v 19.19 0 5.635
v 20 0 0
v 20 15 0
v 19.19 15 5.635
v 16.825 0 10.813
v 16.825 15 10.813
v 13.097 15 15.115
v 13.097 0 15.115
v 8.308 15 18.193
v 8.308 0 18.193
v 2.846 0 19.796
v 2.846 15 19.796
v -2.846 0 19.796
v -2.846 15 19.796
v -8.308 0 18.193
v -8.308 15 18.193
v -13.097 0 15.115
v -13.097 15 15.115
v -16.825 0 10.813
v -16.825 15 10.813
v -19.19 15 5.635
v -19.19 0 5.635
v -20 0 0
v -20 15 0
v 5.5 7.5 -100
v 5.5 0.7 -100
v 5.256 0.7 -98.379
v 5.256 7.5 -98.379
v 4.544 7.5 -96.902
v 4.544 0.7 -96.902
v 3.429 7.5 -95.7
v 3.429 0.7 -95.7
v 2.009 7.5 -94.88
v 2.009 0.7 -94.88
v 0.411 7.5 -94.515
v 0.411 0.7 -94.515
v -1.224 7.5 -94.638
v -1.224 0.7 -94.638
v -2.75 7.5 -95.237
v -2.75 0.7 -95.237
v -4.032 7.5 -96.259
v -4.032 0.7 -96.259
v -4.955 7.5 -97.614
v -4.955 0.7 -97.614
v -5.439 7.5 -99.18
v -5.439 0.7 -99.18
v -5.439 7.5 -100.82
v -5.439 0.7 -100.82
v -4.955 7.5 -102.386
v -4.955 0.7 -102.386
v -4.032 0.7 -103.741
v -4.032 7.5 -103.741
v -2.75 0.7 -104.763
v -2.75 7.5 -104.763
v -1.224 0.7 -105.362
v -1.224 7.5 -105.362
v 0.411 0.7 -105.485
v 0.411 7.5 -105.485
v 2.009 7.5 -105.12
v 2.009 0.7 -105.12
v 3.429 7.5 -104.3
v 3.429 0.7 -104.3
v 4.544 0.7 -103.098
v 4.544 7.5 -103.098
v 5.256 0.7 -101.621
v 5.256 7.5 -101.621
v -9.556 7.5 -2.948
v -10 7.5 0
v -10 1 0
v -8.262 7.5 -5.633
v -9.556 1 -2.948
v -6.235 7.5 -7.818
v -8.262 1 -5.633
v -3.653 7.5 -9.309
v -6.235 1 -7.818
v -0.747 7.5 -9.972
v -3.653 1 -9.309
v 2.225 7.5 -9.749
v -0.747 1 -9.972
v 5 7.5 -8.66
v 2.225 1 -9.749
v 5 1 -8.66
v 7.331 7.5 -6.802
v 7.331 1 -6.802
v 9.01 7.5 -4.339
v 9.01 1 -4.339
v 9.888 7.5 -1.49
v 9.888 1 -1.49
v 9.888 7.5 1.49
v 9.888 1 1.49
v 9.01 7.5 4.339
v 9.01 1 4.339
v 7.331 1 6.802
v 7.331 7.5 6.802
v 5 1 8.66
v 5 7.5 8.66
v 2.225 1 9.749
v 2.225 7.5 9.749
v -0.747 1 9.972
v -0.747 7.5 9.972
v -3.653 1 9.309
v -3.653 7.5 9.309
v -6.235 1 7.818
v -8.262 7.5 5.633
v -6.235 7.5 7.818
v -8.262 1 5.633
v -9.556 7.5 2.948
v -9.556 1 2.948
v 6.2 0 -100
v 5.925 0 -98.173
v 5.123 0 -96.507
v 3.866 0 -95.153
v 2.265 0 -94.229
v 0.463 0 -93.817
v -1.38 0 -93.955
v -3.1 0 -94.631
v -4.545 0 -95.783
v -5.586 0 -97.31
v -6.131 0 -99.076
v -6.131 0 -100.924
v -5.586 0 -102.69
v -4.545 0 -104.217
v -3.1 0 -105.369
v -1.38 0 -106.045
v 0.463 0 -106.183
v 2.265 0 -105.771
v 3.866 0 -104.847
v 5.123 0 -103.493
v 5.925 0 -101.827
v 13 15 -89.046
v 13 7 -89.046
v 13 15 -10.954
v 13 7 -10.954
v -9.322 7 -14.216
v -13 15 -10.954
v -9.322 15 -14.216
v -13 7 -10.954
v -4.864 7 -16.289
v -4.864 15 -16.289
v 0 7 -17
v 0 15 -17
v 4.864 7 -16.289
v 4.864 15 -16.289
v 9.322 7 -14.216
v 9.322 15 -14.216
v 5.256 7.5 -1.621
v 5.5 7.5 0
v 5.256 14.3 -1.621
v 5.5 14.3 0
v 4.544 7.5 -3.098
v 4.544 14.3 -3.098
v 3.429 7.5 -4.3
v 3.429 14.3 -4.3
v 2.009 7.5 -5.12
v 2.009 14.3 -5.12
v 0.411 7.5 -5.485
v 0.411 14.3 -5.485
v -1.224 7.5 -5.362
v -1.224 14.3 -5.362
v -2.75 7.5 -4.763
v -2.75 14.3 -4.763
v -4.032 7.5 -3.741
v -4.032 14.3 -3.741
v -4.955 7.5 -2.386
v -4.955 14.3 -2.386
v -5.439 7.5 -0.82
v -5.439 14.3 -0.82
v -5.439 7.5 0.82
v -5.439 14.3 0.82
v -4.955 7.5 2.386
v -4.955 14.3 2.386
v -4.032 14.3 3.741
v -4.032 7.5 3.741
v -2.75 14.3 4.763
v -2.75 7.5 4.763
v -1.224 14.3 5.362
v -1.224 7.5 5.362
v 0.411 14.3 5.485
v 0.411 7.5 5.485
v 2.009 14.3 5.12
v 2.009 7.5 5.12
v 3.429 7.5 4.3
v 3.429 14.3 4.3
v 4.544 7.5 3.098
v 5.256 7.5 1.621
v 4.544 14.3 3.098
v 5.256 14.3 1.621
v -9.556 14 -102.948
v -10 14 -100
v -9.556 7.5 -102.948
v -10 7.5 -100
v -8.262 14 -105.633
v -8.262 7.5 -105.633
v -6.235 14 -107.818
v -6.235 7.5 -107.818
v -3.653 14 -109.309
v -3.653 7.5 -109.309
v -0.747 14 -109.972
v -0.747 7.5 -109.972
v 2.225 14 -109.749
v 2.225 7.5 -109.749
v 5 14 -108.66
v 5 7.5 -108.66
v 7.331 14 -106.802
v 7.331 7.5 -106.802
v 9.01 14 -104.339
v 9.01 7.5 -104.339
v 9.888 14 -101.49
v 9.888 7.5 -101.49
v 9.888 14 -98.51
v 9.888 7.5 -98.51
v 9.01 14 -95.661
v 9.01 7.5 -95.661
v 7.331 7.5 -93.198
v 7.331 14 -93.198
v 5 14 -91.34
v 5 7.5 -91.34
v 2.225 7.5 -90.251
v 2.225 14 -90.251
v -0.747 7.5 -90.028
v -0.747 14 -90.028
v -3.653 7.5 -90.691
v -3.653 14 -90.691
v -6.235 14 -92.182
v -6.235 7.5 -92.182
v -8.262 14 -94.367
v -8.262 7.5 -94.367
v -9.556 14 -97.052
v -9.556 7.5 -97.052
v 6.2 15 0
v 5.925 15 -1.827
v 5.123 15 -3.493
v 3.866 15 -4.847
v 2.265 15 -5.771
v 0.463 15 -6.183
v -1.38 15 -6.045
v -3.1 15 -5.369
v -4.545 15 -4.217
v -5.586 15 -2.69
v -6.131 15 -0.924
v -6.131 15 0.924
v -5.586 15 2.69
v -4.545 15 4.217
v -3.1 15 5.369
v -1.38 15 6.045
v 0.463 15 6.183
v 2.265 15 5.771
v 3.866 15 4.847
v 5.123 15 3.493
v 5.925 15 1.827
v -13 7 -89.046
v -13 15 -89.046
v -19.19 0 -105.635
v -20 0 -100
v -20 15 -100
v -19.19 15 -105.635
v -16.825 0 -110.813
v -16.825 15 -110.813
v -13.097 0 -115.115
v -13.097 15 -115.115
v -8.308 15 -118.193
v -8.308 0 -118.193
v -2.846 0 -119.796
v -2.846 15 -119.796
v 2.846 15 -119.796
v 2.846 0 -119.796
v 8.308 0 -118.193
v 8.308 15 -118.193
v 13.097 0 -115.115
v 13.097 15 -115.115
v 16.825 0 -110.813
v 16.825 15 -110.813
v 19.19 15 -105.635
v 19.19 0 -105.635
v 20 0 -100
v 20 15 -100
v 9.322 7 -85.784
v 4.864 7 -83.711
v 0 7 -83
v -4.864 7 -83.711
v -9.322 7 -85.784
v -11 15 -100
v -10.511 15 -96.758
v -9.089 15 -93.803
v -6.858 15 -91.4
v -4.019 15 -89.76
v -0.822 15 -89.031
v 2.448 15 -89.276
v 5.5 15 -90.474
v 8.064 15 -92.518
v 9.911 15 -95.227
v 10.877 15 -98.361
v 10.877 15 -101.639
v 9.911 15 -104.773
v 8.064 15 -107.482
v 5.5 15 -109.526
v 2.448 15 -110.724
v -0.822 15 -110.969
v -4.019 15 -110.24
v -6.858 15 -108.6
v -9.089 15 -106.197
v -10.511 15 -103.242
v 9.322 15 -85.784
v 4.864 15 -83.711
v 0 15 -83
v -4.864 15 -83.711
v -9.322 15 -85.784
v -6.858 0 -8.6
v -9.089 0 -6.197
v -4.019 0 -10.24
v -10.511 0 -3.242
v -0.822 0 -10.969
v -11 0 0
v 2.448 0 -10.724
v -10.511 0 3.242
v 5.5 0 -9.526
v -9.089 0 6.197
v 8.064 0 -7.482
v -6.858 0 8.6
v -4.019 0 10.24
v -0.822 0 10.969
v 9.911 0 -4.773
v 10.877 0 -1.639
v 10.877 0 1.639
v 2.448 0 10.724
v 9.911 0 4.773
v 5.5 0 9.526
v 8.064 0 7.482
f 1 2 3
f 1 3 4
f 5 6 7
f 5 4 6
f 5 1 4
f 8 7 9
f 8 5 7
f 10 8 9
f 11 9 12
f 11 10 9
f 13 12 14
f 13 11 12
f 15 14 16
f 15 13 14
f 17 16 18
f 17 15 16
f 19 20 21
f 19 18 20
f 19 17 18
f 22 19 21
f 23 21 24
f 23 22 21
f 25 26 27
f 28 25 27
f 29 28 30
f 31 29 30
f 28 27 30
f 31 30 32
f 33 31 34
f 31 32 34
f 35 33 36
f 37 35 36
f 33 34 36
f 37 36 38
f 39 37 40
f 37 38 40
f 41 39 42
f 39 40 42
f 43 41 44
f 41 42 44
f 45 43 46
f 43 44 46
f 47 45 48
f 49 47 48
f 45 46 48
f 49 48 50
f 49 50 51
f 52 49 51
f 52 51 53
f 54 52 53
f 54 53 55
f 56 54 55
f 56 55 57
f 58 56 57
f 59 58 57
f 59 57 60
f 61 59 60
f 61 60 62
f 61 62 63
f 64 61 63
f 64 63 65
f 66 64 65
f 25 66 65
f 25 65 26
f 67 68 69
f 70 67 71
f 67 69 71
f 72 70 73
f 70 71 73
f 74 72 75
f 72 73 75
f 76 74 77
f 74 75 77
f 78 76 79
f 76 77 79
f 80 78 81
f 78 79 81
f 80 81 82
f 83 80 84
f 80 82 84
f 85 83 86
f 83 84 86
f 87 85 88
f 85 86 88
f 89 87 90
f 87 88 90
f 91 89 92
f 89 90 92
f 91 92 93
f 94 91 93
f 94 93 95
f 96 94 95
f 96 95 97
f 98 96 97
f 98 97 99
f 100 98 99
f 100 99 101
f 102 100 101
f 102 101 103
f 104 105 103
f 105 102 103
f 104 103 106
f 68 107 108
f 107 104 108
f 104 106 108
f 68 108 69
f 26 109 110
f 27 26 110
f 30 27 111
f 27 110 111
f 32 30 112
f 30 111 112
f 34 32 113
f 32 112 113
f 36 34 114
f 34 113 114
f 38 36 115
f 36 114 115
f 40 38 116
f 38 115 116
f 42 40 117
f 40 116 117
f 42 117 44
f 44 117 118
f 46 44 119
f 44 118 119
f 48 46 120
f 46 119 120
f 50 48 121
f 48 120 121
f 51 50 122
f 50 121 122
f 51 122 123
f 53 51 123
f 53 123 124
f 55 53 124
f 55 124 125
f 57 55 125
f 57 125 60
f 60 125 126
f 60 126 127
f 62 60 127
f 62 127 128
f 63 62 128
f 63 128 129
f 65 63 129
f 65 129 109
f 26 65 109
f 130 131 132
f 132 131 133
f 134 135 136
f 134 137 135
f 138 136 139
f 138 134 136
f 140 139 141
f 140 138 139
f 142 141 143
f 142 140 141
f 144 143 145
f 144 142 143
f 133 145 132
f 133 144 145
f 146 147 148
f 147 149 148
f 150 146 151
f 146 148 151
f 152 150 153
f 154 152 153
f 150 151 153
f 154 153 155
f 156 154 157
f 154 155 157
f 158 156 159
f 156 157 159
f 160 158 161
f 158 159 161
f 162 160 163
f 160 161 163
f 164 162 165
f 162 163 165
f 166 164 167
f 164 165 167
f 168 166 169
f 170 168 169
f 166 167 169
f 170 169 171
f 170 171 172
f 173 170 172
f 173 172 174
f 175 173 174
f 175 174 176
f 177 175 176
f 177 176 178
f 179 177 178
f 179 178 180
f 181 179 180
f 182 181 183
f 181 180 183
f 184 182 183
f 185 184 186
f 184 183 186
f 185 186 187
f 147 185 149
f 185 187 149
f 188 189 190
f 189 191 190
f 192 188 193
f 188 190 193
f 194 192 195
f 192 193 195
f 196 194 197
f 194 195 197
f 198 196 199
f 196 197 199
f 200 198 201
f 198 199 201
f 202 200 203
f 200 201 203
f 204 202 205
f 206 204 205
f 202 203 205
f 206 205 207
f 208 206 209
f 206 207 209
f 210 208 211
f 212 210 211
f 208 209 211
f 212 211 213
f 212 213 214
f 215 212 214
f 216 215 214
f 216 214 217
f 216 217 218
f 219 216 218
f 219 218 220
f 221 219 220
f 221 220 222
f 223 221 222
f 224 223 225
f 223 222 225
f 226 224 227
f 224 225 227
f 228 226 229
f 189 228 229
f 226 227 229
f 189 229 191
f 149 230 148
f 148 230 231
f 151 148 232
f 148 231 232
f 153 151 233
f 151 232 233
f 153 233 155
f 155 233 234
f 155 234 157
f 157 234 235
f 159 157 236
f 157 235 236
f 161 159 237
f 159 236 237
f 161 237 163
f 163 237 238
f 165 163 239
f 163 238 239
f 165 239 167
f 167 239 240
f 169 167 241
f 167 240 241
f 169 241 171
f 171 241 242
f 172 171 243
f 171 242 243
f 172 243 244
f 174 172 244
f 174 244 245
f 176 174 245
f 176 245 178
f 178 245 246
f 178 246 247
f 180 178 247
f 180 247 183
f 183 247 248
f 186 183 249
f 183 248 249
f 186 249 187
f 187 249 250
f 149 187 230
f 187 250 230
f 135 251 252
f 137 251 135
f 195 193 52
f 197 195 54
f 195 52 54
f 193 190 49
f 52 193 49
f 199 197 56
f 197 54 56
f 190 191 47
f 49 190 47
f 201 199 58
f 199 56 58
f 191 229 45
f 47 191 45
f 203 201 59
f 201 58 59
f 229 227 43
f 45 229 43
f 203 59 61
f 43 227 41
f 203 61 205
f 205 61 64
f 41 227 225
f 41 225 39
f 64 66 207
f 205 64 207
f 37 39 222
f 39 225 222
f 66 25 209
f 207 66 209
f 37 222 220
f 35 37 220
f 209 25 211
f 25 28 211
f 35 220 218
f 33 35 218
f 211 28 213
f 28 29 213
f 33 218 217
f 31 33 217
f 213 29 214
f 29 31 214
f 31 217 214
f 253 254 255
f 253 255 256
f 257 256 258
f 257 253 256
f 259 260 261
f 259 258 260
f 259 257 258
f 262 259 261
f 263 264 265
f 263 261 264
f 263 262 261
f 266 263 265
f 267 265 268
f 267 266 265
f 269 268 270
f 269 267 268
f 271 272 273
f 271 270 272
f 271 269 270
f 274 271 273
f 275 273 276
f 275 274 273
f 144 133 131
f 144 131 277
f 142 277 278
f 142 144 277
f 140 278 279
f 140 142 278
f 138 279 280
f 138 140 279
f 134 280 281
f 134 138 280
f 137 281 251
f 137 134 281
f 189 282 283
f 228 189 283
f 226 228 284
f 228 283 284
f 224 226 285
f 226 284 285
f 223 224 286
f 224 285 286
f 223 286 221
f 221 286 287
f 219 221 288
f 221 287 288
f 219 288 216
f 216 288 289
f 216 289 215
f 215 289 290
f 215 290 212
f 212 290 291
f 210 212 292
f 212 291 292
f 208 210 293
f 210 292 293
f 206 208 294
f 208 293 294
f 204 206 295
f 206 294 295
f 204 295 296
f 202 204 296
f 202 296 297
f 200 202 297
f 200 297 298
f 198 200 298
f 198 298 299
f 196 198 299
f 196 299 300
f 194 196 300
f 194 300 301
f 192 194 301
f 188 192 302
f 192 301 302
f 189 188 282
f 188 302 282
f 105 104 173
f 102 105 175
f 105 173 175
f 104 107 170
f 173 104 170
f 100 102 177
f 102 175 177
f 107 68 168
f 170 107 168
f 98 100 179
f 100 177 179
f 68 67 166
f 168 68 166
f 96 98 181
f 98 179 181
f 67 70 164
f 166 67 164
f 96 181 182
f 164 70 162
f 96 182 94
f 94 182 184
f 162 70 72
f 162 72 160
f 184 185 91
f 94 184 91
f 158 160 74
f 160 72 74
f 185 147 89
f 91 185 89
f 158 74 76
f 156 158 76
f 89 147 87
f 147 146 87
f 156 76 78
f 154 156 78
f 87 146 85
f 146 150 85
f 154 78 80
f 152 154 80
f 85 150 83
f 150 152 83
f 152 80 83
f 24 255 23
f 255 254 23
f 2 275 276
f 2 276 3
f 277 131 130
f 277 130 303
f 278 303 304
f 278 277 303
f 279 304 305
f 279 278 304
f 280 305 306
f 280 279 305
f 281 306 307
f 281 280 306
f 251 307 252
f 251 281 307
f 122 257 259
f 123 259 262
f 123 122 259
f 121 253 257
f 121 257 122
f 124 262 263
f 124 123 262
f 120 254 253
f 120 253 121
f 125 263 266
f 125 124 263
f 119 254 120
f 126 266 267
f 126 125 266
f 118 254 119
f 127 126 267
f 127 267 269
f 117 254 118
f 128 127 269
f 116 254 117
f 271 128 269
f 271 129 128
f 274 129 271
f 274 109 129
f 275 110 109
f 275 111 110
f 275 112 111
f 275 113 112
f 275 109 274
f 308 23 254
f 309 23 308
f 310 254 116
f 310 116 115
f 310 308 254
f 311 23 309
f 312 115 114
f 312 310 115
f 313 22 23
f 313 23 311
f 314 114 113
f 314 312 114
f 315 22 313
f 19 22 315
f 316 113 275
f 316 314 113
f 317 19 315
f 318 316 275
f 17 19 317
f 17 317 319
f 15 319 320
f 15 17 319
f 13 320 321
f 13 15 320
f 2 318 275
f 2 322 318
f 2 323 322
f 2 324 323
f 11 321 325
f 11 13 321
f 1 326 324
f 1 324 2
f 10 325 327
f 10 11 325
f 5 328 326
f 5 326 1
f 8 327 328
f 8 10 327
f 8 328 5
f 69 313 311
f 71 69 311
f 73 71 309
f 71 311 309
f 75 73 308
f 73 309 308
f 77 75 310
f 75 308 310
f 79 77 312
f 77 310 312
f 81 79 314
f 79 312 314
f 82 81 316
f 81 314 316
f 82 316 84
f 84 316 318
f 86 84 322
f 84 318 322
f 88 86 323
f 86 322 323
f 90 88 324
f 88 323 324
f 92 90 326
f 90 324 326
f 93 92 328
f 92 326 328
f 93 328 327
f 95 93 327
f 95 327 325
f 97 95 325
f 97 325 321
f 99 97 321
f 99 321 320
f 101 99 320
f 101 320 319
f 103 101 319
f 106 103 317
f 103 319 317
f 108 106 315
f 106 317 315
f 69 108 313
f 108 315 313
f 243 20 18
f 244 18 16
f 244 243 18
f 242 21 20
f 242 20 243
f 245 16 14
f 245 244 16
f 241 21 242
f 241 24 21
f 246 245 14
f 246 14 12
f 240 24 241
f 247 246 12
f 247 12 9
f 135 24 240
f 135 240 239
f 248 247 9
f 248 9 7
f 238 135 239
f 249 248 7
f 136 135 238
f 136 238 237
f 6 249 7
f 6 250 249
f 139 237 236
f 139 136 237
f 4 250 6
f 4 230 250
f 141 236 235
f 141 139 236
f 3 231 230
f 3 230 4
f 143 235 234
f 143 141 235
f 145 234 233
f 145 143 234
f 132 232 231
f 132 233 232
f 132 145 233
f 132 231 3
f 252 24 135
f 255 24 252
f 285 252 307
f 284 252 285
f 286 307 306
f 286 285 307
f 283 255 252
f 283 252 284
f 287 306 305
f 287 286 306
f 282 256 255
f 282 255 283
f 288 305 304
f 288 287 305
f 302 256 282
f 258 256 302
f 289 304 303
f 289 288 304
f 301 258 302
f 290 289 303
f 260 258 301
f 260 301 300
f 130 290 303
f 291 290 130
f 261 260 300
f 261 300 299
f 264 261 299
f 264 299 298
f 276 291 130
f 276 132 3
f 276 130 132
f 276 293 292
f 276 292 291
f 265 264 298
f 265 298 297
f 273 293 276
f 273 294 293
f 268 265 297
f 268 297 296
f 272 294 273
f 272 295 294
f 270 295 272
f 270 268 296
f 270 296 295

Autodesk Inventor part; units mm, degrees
ref_plane "YZ Plane" through (0, 0, 0) normal (1, 0, 0) x (0, 1, 0)
ref_plane "XZ Plane" through (0, 0, 0) normal (0, 1, 0) x (-1, 0, 0)
ref_plane "XY Plane" through (0, 0, 0) normal (0, 0, 1) x (1, 0, 0)
sketch "Sketch1" plane through (0, 0, 0) normal (0, 1, 0) x (-1, 0, 0)
  circle A0 centre (0, 0) radius 10
  circle A1 centre (0, 0) radius 20
  line L0 (0, 0) -> (0, -100)
  circle A2 centre (0, -100) radius 10
  circle A3 centre (0, -100) radius 20
  line L1 (0, -100) -> (20, -100)
  line L2 (20, -100) -> (20, 0)
  line L3 (20, 0) -> (0, 0)
  line L4 (0, 0) -> (0, -100)
  line L5 (0, -100) -> (-20, -100)
  line L6 (-20, -100) -> (-20, 0)
  line L7 (-20, 0) -> (0, 0)
  line L8 (0, 0) -> (0, -100)
  point P0 (20, -100)
  dimension "d0" = 20
  dimension "d4" = 40
  dimension "d23" = 20
  dimension "d24" = 40
extrude "Extrusion1" add sketch "Sketch1" along normal blind 15 contours L3 A1 L0 A0 | A0 L7 A1 L3 | A0 L0 A1 L7 | L2 A3 L0 A1 | A1 L0 A3 L6 | L1 A2 L0 A3 | A3 L5 A2 L1 | A3 L0 A2 L5
shell "Shell2" thickness 7 removed faces 1 at (-15.2269, 15, -36.0766)
sketch "Sketch8" plane through (0, 15, 0) normal (0, 1, 0) x (1, 0, 0)
  line L0 (-13, 10.9545) -> (-13, 89.0455) projected
  arc A0 (-13, 89.0455) -> (13, 89.0455) centre (0, 100) ccw projected
  line L1 (13, 89.0455) -> (13, 10.9545) projected
  arc A1 (13, 10.9545) -> (-13, 10.9545) centre (0, 0) ccw projected
  arc A2 (-20, 0) -> (20, 0) centre (0, 0) ccw projected
  line L2 (20, 0) -> (20, 100) projected
  arc A3 (20, 100) -> (-20, 100) centre (0, 100) ccw projected
  line L3 (-20, 100) -> (-20, 0) projected
  circle A4 centre (0, 0) radius 10 projected
  circle A5 centre (0, 100) radius 10 projected
  circle A6 centre (0, 0) radius 5.5
  circle A7 centre (0, 100) radius 5.5
  dimension "d26" = 11
  dimension "d27" = 11
extrude "Extrusion8" add sketch "Sketch8" against normal blind 7.5 contours A4
sketch "Sketch9" plane through (0, 0, 0) normal (0, -1, 0) x (1, 0, 0)
  arc A0 (20, 0) -> (-20, 0) centre (0, 0) ccw projected
  line L0 (-20, -100) -> (-20, 0) projected
  arc A1 (-20, -100) -> (20, -100) centre (0, -100) ccw projected
  line L1 (20, 0) -> (20, -100) projected
  circle A2 centre (0, 0) radius 10 projected
  circle A3 centre (0, -100) radius 10 projected
  circle A4 centre (0, -100) radius 5.5
  dimension "d30" = 11
extrude "Extrusion9" add sketch "Sketch9" against normal blind 7.5 contours A3
chamfer "Chamfer1" distance 1 angle 45 2 edges at (10, 15, -100) (10, 0, 0)
chamfer "Chamfer2" distance 0.7 angle 45 2 edges at (-5.5, 15, 0) (-5.5, 0, -100)
properties part number "ramię_korby" material "ABS Plastic"
